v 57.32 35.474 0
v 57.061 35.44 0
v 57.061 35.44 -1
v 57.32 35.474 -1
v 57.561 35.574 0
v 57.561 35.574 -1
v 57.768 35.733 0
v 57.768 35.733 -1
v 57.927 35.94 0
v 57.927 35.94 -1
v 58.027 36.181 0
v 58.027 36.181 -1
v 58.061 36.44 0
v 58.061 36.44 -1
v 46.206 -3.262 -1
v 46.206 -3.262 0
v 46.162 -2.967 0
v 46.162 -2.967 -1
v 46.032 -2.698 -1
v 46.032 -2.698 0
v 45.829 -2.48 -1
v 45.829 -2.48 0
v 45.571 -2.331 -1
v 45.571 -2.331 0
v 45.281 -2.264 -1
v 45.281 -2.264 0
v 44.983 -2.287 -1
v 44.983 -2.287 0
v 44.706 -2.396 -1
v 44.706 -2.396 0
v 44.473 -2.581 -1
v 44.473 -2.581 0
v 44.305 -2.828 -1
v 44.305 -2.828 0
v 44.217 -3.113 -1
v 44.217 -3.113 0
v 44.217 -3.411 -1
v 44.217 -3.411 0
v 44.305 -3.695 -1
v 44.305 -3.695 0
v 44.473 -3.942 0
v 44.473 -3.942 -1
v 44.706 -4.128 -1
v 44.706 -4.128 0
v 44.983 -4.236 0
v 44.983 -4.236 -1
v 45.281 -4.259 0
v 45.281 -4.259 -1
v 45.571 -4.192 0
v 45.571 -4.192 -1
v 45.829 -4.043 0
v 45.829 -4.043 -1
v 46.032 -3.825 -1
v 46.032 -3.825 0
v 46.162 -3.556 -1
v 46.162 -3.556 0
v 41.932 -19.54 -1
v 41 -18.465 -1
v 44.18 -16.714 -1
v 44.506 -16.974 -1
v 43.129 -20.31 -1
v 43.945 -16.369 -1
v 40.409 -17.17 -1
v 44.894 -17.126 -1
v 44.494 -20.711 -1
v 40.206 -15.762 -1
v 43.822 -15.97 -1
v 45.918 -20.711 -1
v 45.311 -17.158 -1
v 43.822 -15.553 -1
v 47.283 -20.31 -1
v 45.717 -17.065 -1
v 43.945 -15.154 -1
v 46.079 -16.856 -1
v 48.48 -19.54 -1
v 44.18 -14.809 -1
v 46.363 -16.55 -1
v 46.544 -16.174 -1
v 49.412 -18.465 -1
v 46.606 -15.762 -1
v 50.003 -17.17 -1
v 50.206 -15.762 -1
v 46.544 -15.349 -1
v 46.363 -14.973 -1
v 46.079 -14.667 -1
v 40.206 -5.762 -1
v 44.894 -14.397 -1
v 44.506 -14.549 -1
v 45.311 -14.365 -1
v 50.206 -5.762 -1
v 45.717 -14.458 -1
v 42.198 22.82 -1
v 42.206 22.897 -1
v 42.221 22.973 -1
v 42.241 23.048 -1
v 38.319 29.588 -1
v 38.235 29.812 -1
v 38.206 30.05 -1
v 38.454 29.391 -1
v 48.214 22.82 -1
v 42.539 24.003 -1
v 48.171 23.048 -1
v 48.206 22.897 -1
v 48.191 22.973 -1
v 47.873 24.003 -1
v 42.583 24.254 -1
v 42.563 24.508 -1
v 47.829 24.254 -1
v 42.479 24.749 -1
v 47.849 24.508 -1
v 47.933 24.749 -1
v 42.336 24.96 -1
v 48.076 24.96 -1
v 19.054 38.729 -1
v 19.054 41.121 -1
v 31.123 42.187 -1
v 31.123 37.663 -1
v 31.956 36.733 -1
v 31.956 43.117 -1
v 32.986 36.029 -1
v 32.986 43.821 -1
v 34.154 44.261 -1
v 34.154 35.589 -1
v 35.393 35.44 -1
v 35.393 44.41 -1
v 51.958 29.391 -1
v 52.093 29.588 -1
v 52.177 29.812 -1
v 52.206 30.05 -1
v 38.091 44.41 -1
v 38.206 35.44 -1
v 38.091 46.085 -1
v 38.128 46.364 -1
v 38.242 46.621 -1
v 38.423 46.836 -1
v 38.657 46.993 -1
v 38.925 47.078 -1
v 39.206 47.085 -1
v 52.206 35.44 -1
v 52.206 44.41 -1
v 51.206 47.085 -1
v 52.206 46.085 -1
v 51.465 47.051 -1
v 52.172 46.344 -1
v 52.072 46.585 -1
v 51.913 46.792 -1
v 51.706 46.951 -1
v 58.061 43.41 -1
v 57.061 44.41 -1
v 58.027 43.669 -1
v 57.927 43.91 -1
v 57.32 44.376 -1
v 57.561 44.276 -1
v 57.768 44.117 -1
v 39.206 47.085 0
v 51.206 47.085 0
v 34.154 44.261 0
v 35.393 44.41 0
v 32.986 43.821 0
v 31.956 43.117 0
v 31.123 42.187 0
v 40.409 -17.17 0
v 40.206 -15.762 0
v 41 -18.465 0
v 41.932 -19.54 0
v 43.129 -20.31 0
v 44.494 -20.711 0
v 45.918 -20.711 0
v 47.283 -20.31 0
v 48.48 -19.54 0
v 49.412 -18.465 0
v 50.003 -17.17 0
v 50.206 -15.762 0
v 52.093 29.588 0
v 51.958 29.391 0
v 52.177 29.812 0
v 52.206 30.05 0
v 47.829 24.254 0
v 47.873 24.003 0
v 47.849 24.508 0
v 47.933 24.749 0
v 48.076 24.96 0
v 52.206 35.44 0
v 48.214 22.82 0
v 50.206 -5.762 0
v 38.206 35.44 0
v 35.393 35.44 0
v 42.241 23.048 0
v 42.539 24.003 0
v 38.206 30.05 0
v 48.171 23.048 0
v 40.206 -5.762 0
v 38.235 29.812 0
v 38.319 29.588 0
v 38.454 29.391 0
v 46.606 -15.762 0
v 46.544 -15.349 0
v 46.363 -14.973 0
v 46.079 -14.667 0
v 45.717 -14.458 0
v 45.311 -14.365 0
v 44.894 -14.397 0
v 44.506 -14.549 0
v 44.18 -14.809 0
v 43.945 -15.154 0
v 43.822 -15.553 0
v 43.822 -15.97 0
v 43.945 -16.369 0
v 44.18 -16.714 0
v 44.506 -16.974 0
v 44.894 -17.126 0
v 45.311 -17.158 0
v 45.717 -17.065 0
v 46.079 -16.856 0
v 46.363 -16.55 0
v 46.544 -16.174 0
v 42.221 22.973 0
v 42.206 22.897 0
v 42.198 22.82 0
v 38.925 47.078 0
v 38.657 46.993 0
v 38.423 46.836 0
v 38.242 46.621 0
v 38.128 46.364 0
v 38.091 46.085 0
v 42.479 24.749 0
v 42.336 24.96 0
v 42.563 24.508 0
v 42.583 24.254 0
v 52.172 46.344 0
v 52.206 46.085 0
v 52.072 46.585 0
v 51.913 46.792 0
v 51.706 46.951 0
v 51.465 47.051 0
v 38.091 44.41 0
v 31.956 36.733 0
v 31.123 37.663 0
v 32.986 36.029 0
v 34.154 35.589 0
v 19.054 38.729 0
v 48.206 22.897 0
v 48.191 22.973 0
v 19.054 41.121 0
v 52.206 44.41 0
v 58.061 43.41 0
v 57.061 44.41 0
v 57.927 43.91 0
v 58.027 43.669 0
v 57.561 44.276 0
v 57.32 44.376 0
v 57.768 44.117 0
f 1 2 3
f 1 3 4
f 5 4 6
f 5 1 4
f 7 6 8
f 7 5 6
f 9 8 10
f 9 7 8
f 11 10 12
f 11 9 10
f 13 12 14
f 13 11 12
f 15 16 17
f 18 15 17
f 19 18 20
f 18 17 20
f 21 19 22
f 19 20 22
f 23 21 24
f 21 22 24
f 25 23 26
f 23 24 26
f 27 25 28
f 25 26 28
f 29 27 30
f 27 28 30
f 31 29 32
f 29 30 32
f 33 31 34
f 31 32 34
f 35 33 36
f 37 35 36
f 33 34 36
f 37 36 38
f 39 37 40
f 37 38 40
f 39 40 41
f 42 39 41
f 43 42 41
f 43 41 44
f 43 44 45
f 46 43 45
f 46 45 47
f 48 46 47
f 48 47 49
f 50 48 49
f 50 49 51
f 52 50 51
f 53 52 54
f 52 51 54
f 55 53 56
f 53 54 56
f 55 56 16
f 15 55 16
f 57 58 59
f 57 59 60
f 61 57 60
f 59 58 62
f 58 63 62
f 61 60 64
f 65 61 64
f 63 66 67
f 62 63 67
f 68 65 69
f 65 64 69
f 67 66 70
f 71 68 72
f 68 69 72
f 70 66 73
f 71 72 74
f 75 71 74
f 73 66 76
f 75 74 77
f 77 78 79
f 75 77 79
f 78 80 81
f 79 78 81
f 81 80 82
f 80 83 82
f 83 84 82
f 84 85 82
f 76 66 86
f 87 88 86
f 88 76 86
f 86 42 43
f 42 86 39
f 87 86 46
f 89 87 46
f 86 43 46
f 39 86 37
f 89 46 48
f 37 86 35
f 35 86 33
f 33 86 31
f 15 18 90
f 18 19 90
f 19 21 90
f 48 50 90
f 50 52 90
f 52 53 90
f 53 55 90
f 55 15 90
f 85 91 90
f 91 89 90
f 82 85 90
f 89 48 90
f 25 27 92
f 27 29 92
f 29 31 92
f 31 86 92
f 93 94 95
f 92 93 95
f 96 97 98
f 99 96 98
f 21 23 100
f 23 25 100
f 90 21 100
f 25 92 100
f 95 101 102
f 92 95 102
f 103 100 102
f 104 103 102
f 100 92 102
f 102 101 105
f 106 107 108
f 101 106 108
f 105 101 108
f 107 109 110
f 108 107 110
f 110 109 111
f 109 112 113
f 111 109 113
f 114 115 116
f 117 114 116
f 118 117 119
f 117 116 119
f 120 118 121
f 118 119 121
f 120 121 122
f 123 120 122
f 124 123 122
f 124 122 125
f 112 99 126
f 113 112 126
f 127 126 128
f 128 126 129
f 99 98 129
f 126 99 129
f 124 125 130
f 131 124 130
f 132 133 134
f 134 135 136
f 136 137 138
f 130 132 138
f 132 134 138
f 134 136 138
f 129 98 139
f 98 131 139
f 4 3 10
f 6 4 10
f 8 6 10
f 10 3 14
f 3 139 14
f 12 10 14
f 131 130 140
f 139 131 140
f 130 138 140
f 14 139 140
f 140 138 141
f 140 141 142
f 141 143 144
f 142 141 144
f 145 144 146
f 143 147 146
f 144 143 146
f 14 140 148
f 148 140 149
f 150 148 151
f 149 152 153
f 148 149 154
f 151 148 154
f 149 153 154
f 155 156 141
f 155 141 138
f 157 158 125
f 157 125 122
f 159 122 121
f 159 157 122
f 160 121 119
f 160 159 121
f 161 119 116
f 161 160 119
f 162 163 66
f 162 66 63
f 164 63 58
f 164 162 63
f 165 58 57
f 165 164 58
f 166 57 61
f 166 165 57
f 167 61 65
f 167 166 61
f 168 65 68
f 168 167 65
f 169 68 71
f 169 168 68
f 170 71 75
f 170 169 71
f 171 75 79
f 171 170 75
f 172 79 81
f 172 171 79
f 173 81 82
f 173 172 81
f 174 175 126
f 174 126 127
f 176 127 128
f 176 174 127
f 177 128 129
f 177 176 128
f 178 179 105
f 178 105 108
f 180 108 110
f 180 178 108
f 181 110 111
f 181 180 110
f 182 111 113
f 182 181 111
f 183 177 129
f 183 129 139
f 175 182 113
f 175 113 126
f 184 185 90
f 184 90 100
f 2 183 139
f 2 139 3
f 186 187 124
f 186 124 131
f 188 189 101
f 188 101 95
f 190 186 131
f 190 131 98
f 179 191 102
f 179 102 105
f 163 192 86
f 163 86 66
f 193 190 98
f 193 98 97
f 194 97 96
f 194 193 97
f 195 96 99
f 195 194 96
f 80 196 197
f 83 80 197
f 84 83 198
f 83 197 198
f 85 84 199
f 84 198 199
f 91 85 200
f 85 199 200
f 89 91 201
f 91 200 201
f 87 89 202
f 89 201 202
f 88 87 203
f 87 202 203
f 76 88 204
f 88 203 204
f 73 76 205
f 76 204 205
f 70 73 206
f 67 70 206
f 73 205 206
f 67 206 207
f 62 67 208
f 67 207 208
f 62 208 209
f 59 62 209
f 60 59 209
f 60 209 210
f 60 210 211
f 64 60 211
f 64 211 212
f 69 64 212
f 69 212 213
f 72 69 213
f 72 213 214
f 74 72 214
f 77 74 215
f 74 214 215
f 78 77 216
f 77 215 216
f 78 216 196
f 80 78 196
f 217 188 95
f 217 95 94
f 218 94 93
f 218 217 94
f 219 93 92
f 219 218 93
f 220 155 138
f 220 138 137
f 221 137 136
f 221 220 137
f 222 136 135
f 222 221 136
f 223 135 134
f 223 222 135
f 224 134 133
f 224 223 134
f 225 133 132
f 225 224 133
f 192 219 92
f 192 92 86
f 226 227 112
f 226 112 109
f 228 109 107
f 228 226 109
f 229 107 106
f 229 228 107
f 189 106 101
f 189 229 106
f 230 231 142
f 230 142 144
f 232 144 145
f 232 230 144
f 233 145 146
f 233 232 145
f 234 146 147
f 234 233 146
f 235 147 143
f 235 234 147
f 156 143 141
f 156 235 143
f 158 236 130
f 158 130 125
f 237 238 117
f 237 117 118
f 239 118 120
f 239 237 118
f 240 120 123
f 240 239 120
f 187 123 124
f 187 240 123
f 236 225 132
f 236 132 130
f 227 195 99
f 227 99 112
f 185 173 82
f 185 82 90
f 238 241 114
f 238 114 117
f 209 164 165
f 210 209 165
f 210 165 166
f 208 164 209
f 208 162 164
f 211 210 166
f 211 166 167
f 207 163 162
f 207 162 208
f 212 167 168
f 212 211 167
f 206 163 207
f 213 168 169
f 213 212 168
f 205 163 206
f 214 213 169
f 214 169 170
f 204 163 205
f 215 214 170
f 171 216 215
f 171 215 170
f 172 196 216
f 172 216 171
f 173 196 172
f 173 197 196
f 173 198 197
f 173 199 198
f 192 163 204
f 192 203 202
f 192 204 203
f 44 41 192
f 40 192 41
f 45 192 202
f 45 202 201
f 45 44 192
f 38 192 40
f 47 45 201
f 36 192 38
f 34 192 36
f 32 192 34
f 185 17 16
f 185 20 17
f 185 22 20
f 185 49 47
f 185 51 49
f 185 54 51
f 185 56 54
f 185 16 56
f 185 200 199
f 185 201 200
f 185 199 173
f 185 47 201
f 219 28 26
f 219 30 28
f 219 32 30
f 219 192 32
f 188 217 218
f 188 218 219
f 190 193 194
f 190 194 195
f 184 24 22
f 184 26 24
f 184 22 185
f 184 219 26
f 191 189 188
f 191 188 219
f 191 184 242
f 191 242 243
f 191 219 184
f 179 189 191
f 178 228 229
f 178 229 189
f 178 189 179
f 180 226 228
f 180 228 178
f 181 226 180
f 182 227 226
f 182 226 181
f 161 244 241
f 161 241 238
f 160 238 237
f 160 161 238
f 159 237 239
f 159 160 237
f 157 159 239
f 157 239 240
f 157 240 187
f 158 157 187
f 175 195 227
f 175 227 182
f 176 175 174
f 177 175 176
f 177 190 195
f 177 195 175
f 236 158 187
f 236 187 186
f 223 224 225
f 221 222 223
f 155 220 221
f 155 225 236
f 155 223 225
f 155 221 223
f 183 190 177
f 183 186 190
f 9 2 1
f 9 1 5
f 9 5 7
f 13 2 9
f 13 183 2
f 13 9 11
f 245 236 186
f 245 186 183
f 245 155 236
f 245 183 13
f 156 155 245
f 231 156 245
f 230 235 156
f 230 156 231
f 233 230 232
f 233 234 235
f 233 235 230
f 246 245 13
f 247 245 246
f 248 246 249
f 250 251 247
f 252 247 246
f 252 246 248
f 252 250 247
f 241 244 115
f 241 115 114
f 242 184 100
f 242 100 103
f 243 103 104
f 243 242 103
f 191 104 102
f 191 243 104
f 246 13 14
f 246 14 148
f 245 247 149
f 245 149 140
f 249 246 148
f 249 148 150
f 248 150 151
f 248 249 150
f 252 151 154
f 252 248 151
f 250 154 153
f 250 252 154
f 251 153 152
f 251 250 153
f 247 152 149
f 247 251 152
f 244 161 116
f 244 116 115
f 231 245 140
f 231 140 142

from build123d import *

# Parameters (mm, degrees)
MODEL_R           = 1
MODEL_R_2         = 1.4
BRIDA_BASE1_DEPTH = 1


# Sheet-metal steps are written as plain solids
with BuildPart() as part:
    # Model → Brida base1 (new body)
    with BuildSketch(Plane.XY):
        with BuildLine():
            Line((57.06109229, 44.40989684), (52.2059904, 44.40989684))
            Line((52.2059904, 44.40989684), (52.2059904, 46.085251303))
            ThreePointArc((52.2059904, 46.085251303), (51.913097181, 46.792358084), (51.2059904, 47.085251303))
            Line((51.2059904, 47.085251303), (39.2059904, 47.085251303))
            ThreePointArc((39.2059904, 47.085251303), (38.423096783, 46.836466455), (38.090692903, 46.085251454))
            Line((38.090692903, 46.085251454), (38.090692903, 44.40989684))
            Line((38.090692903, 44.40989684), (35.393347813, 44.40989684))
            ThreePointArc((35.393347813, 44.40989684), (32.986264566, 43.82101601), (31.122905732, 42.187392968))
            Line((31.122905732, 42.187392968), (19.054035234, 41.120549071))
            Line((19.054035234, 41.120549071), (19.054035234, 38.729385282))
            Line((19.054035234, 38.729385282), (31.122905732, 37.662541385))
            ThreePointArc((31.122905732, 37.662541385), (32.986264566, 36.028918342), (35.393347813, 35.440037512))
            Line((35.393347813, 35.440037512), (38.2059904, 35.440037512))
            Line((38.2059904, 35.440037512), (38.2059904, 30.049740987))
            ThreePointArc((38.2059904, 30.049740987), (38.270016908, 29.697670508), (38.453897645, 29.390683715))
            Line((38.453897645, 29.390683715), (42.336424948, 24.960081428))
            ThreePointArc((42.336424948, 24.960081428), (42.562673339, 24.508023196), (42.538911562, 24.0030674))
            Line((42.538911562, 24.0030674), (42.240856149, 23.048171958))
            ThreePointArc((42.240856149, 23.048171958), (42.212695742, 22.935208537), (42.197855138, 22.819737764))
            Line((42.197855138, 22.819737764), (40.2059904, -5.7615616))
            Line((40.2059904, -5.7615616), (40.2059904, -15.7615616))
            ThreePointArc((40.2059904, -15.7615616), (45.2059904, -20.7615616), (50.2059904, -15.7615616))
            Line((50.2059904, -15.7615616), (50.2059904, -5.7615616))
            Line((50.2059904, -5.7615616), (48.214125662, 22.819737764))
            ThreePointArc((48.214125662, 22.819737764), (48.199285058, 22.935208537), (48.171124651, 23.048171958))
            Line((48.171124651, 23.048171958), (47.873069238, 24.0030674))
            ThreePointArc((47.873069238, 24.0030674), (47.849307461, 24.508023196), (48.075555852, 24.960081428))
            Line((48.075555852, 24.960081428), (51.958083155, 29.390683715))
            ThreePointArc((51.958083155, 29.390683715), (52.141963892, 29.697670508), (52.2059904, 30.049740987))
            Line((52.2059904, 30.049740987), (52.2059904, 35.440037512))
            Line((52.2059904, 35.440037512), (57.06109229, 35.440037512))
            ThreePointArc((57.06109229, 35.440037512), (57.768199071, 35.732930731), (58.06109229, 36.440037513))
            Line((58.06109229, 36.440037513), (58.06109229, 43.40989684))
            ThreePointArc((58.06109229, 43.40989684), (57.768199071, 44.117003621), (57.06109229, 44.40989684))
        make_face()
        with Locations((45.2059904, -3.2615616)):
            Circle(MODEL_R, mode=Mode.SUBTRACT)
        with Locations((45.2059904, -15.7615616)):
            Circle(MODEL_R_2, mode=Mode.SUBTRACT)
    extrude(amount=-BRIDA_BASE1_DEPTH)


solid = part.part
